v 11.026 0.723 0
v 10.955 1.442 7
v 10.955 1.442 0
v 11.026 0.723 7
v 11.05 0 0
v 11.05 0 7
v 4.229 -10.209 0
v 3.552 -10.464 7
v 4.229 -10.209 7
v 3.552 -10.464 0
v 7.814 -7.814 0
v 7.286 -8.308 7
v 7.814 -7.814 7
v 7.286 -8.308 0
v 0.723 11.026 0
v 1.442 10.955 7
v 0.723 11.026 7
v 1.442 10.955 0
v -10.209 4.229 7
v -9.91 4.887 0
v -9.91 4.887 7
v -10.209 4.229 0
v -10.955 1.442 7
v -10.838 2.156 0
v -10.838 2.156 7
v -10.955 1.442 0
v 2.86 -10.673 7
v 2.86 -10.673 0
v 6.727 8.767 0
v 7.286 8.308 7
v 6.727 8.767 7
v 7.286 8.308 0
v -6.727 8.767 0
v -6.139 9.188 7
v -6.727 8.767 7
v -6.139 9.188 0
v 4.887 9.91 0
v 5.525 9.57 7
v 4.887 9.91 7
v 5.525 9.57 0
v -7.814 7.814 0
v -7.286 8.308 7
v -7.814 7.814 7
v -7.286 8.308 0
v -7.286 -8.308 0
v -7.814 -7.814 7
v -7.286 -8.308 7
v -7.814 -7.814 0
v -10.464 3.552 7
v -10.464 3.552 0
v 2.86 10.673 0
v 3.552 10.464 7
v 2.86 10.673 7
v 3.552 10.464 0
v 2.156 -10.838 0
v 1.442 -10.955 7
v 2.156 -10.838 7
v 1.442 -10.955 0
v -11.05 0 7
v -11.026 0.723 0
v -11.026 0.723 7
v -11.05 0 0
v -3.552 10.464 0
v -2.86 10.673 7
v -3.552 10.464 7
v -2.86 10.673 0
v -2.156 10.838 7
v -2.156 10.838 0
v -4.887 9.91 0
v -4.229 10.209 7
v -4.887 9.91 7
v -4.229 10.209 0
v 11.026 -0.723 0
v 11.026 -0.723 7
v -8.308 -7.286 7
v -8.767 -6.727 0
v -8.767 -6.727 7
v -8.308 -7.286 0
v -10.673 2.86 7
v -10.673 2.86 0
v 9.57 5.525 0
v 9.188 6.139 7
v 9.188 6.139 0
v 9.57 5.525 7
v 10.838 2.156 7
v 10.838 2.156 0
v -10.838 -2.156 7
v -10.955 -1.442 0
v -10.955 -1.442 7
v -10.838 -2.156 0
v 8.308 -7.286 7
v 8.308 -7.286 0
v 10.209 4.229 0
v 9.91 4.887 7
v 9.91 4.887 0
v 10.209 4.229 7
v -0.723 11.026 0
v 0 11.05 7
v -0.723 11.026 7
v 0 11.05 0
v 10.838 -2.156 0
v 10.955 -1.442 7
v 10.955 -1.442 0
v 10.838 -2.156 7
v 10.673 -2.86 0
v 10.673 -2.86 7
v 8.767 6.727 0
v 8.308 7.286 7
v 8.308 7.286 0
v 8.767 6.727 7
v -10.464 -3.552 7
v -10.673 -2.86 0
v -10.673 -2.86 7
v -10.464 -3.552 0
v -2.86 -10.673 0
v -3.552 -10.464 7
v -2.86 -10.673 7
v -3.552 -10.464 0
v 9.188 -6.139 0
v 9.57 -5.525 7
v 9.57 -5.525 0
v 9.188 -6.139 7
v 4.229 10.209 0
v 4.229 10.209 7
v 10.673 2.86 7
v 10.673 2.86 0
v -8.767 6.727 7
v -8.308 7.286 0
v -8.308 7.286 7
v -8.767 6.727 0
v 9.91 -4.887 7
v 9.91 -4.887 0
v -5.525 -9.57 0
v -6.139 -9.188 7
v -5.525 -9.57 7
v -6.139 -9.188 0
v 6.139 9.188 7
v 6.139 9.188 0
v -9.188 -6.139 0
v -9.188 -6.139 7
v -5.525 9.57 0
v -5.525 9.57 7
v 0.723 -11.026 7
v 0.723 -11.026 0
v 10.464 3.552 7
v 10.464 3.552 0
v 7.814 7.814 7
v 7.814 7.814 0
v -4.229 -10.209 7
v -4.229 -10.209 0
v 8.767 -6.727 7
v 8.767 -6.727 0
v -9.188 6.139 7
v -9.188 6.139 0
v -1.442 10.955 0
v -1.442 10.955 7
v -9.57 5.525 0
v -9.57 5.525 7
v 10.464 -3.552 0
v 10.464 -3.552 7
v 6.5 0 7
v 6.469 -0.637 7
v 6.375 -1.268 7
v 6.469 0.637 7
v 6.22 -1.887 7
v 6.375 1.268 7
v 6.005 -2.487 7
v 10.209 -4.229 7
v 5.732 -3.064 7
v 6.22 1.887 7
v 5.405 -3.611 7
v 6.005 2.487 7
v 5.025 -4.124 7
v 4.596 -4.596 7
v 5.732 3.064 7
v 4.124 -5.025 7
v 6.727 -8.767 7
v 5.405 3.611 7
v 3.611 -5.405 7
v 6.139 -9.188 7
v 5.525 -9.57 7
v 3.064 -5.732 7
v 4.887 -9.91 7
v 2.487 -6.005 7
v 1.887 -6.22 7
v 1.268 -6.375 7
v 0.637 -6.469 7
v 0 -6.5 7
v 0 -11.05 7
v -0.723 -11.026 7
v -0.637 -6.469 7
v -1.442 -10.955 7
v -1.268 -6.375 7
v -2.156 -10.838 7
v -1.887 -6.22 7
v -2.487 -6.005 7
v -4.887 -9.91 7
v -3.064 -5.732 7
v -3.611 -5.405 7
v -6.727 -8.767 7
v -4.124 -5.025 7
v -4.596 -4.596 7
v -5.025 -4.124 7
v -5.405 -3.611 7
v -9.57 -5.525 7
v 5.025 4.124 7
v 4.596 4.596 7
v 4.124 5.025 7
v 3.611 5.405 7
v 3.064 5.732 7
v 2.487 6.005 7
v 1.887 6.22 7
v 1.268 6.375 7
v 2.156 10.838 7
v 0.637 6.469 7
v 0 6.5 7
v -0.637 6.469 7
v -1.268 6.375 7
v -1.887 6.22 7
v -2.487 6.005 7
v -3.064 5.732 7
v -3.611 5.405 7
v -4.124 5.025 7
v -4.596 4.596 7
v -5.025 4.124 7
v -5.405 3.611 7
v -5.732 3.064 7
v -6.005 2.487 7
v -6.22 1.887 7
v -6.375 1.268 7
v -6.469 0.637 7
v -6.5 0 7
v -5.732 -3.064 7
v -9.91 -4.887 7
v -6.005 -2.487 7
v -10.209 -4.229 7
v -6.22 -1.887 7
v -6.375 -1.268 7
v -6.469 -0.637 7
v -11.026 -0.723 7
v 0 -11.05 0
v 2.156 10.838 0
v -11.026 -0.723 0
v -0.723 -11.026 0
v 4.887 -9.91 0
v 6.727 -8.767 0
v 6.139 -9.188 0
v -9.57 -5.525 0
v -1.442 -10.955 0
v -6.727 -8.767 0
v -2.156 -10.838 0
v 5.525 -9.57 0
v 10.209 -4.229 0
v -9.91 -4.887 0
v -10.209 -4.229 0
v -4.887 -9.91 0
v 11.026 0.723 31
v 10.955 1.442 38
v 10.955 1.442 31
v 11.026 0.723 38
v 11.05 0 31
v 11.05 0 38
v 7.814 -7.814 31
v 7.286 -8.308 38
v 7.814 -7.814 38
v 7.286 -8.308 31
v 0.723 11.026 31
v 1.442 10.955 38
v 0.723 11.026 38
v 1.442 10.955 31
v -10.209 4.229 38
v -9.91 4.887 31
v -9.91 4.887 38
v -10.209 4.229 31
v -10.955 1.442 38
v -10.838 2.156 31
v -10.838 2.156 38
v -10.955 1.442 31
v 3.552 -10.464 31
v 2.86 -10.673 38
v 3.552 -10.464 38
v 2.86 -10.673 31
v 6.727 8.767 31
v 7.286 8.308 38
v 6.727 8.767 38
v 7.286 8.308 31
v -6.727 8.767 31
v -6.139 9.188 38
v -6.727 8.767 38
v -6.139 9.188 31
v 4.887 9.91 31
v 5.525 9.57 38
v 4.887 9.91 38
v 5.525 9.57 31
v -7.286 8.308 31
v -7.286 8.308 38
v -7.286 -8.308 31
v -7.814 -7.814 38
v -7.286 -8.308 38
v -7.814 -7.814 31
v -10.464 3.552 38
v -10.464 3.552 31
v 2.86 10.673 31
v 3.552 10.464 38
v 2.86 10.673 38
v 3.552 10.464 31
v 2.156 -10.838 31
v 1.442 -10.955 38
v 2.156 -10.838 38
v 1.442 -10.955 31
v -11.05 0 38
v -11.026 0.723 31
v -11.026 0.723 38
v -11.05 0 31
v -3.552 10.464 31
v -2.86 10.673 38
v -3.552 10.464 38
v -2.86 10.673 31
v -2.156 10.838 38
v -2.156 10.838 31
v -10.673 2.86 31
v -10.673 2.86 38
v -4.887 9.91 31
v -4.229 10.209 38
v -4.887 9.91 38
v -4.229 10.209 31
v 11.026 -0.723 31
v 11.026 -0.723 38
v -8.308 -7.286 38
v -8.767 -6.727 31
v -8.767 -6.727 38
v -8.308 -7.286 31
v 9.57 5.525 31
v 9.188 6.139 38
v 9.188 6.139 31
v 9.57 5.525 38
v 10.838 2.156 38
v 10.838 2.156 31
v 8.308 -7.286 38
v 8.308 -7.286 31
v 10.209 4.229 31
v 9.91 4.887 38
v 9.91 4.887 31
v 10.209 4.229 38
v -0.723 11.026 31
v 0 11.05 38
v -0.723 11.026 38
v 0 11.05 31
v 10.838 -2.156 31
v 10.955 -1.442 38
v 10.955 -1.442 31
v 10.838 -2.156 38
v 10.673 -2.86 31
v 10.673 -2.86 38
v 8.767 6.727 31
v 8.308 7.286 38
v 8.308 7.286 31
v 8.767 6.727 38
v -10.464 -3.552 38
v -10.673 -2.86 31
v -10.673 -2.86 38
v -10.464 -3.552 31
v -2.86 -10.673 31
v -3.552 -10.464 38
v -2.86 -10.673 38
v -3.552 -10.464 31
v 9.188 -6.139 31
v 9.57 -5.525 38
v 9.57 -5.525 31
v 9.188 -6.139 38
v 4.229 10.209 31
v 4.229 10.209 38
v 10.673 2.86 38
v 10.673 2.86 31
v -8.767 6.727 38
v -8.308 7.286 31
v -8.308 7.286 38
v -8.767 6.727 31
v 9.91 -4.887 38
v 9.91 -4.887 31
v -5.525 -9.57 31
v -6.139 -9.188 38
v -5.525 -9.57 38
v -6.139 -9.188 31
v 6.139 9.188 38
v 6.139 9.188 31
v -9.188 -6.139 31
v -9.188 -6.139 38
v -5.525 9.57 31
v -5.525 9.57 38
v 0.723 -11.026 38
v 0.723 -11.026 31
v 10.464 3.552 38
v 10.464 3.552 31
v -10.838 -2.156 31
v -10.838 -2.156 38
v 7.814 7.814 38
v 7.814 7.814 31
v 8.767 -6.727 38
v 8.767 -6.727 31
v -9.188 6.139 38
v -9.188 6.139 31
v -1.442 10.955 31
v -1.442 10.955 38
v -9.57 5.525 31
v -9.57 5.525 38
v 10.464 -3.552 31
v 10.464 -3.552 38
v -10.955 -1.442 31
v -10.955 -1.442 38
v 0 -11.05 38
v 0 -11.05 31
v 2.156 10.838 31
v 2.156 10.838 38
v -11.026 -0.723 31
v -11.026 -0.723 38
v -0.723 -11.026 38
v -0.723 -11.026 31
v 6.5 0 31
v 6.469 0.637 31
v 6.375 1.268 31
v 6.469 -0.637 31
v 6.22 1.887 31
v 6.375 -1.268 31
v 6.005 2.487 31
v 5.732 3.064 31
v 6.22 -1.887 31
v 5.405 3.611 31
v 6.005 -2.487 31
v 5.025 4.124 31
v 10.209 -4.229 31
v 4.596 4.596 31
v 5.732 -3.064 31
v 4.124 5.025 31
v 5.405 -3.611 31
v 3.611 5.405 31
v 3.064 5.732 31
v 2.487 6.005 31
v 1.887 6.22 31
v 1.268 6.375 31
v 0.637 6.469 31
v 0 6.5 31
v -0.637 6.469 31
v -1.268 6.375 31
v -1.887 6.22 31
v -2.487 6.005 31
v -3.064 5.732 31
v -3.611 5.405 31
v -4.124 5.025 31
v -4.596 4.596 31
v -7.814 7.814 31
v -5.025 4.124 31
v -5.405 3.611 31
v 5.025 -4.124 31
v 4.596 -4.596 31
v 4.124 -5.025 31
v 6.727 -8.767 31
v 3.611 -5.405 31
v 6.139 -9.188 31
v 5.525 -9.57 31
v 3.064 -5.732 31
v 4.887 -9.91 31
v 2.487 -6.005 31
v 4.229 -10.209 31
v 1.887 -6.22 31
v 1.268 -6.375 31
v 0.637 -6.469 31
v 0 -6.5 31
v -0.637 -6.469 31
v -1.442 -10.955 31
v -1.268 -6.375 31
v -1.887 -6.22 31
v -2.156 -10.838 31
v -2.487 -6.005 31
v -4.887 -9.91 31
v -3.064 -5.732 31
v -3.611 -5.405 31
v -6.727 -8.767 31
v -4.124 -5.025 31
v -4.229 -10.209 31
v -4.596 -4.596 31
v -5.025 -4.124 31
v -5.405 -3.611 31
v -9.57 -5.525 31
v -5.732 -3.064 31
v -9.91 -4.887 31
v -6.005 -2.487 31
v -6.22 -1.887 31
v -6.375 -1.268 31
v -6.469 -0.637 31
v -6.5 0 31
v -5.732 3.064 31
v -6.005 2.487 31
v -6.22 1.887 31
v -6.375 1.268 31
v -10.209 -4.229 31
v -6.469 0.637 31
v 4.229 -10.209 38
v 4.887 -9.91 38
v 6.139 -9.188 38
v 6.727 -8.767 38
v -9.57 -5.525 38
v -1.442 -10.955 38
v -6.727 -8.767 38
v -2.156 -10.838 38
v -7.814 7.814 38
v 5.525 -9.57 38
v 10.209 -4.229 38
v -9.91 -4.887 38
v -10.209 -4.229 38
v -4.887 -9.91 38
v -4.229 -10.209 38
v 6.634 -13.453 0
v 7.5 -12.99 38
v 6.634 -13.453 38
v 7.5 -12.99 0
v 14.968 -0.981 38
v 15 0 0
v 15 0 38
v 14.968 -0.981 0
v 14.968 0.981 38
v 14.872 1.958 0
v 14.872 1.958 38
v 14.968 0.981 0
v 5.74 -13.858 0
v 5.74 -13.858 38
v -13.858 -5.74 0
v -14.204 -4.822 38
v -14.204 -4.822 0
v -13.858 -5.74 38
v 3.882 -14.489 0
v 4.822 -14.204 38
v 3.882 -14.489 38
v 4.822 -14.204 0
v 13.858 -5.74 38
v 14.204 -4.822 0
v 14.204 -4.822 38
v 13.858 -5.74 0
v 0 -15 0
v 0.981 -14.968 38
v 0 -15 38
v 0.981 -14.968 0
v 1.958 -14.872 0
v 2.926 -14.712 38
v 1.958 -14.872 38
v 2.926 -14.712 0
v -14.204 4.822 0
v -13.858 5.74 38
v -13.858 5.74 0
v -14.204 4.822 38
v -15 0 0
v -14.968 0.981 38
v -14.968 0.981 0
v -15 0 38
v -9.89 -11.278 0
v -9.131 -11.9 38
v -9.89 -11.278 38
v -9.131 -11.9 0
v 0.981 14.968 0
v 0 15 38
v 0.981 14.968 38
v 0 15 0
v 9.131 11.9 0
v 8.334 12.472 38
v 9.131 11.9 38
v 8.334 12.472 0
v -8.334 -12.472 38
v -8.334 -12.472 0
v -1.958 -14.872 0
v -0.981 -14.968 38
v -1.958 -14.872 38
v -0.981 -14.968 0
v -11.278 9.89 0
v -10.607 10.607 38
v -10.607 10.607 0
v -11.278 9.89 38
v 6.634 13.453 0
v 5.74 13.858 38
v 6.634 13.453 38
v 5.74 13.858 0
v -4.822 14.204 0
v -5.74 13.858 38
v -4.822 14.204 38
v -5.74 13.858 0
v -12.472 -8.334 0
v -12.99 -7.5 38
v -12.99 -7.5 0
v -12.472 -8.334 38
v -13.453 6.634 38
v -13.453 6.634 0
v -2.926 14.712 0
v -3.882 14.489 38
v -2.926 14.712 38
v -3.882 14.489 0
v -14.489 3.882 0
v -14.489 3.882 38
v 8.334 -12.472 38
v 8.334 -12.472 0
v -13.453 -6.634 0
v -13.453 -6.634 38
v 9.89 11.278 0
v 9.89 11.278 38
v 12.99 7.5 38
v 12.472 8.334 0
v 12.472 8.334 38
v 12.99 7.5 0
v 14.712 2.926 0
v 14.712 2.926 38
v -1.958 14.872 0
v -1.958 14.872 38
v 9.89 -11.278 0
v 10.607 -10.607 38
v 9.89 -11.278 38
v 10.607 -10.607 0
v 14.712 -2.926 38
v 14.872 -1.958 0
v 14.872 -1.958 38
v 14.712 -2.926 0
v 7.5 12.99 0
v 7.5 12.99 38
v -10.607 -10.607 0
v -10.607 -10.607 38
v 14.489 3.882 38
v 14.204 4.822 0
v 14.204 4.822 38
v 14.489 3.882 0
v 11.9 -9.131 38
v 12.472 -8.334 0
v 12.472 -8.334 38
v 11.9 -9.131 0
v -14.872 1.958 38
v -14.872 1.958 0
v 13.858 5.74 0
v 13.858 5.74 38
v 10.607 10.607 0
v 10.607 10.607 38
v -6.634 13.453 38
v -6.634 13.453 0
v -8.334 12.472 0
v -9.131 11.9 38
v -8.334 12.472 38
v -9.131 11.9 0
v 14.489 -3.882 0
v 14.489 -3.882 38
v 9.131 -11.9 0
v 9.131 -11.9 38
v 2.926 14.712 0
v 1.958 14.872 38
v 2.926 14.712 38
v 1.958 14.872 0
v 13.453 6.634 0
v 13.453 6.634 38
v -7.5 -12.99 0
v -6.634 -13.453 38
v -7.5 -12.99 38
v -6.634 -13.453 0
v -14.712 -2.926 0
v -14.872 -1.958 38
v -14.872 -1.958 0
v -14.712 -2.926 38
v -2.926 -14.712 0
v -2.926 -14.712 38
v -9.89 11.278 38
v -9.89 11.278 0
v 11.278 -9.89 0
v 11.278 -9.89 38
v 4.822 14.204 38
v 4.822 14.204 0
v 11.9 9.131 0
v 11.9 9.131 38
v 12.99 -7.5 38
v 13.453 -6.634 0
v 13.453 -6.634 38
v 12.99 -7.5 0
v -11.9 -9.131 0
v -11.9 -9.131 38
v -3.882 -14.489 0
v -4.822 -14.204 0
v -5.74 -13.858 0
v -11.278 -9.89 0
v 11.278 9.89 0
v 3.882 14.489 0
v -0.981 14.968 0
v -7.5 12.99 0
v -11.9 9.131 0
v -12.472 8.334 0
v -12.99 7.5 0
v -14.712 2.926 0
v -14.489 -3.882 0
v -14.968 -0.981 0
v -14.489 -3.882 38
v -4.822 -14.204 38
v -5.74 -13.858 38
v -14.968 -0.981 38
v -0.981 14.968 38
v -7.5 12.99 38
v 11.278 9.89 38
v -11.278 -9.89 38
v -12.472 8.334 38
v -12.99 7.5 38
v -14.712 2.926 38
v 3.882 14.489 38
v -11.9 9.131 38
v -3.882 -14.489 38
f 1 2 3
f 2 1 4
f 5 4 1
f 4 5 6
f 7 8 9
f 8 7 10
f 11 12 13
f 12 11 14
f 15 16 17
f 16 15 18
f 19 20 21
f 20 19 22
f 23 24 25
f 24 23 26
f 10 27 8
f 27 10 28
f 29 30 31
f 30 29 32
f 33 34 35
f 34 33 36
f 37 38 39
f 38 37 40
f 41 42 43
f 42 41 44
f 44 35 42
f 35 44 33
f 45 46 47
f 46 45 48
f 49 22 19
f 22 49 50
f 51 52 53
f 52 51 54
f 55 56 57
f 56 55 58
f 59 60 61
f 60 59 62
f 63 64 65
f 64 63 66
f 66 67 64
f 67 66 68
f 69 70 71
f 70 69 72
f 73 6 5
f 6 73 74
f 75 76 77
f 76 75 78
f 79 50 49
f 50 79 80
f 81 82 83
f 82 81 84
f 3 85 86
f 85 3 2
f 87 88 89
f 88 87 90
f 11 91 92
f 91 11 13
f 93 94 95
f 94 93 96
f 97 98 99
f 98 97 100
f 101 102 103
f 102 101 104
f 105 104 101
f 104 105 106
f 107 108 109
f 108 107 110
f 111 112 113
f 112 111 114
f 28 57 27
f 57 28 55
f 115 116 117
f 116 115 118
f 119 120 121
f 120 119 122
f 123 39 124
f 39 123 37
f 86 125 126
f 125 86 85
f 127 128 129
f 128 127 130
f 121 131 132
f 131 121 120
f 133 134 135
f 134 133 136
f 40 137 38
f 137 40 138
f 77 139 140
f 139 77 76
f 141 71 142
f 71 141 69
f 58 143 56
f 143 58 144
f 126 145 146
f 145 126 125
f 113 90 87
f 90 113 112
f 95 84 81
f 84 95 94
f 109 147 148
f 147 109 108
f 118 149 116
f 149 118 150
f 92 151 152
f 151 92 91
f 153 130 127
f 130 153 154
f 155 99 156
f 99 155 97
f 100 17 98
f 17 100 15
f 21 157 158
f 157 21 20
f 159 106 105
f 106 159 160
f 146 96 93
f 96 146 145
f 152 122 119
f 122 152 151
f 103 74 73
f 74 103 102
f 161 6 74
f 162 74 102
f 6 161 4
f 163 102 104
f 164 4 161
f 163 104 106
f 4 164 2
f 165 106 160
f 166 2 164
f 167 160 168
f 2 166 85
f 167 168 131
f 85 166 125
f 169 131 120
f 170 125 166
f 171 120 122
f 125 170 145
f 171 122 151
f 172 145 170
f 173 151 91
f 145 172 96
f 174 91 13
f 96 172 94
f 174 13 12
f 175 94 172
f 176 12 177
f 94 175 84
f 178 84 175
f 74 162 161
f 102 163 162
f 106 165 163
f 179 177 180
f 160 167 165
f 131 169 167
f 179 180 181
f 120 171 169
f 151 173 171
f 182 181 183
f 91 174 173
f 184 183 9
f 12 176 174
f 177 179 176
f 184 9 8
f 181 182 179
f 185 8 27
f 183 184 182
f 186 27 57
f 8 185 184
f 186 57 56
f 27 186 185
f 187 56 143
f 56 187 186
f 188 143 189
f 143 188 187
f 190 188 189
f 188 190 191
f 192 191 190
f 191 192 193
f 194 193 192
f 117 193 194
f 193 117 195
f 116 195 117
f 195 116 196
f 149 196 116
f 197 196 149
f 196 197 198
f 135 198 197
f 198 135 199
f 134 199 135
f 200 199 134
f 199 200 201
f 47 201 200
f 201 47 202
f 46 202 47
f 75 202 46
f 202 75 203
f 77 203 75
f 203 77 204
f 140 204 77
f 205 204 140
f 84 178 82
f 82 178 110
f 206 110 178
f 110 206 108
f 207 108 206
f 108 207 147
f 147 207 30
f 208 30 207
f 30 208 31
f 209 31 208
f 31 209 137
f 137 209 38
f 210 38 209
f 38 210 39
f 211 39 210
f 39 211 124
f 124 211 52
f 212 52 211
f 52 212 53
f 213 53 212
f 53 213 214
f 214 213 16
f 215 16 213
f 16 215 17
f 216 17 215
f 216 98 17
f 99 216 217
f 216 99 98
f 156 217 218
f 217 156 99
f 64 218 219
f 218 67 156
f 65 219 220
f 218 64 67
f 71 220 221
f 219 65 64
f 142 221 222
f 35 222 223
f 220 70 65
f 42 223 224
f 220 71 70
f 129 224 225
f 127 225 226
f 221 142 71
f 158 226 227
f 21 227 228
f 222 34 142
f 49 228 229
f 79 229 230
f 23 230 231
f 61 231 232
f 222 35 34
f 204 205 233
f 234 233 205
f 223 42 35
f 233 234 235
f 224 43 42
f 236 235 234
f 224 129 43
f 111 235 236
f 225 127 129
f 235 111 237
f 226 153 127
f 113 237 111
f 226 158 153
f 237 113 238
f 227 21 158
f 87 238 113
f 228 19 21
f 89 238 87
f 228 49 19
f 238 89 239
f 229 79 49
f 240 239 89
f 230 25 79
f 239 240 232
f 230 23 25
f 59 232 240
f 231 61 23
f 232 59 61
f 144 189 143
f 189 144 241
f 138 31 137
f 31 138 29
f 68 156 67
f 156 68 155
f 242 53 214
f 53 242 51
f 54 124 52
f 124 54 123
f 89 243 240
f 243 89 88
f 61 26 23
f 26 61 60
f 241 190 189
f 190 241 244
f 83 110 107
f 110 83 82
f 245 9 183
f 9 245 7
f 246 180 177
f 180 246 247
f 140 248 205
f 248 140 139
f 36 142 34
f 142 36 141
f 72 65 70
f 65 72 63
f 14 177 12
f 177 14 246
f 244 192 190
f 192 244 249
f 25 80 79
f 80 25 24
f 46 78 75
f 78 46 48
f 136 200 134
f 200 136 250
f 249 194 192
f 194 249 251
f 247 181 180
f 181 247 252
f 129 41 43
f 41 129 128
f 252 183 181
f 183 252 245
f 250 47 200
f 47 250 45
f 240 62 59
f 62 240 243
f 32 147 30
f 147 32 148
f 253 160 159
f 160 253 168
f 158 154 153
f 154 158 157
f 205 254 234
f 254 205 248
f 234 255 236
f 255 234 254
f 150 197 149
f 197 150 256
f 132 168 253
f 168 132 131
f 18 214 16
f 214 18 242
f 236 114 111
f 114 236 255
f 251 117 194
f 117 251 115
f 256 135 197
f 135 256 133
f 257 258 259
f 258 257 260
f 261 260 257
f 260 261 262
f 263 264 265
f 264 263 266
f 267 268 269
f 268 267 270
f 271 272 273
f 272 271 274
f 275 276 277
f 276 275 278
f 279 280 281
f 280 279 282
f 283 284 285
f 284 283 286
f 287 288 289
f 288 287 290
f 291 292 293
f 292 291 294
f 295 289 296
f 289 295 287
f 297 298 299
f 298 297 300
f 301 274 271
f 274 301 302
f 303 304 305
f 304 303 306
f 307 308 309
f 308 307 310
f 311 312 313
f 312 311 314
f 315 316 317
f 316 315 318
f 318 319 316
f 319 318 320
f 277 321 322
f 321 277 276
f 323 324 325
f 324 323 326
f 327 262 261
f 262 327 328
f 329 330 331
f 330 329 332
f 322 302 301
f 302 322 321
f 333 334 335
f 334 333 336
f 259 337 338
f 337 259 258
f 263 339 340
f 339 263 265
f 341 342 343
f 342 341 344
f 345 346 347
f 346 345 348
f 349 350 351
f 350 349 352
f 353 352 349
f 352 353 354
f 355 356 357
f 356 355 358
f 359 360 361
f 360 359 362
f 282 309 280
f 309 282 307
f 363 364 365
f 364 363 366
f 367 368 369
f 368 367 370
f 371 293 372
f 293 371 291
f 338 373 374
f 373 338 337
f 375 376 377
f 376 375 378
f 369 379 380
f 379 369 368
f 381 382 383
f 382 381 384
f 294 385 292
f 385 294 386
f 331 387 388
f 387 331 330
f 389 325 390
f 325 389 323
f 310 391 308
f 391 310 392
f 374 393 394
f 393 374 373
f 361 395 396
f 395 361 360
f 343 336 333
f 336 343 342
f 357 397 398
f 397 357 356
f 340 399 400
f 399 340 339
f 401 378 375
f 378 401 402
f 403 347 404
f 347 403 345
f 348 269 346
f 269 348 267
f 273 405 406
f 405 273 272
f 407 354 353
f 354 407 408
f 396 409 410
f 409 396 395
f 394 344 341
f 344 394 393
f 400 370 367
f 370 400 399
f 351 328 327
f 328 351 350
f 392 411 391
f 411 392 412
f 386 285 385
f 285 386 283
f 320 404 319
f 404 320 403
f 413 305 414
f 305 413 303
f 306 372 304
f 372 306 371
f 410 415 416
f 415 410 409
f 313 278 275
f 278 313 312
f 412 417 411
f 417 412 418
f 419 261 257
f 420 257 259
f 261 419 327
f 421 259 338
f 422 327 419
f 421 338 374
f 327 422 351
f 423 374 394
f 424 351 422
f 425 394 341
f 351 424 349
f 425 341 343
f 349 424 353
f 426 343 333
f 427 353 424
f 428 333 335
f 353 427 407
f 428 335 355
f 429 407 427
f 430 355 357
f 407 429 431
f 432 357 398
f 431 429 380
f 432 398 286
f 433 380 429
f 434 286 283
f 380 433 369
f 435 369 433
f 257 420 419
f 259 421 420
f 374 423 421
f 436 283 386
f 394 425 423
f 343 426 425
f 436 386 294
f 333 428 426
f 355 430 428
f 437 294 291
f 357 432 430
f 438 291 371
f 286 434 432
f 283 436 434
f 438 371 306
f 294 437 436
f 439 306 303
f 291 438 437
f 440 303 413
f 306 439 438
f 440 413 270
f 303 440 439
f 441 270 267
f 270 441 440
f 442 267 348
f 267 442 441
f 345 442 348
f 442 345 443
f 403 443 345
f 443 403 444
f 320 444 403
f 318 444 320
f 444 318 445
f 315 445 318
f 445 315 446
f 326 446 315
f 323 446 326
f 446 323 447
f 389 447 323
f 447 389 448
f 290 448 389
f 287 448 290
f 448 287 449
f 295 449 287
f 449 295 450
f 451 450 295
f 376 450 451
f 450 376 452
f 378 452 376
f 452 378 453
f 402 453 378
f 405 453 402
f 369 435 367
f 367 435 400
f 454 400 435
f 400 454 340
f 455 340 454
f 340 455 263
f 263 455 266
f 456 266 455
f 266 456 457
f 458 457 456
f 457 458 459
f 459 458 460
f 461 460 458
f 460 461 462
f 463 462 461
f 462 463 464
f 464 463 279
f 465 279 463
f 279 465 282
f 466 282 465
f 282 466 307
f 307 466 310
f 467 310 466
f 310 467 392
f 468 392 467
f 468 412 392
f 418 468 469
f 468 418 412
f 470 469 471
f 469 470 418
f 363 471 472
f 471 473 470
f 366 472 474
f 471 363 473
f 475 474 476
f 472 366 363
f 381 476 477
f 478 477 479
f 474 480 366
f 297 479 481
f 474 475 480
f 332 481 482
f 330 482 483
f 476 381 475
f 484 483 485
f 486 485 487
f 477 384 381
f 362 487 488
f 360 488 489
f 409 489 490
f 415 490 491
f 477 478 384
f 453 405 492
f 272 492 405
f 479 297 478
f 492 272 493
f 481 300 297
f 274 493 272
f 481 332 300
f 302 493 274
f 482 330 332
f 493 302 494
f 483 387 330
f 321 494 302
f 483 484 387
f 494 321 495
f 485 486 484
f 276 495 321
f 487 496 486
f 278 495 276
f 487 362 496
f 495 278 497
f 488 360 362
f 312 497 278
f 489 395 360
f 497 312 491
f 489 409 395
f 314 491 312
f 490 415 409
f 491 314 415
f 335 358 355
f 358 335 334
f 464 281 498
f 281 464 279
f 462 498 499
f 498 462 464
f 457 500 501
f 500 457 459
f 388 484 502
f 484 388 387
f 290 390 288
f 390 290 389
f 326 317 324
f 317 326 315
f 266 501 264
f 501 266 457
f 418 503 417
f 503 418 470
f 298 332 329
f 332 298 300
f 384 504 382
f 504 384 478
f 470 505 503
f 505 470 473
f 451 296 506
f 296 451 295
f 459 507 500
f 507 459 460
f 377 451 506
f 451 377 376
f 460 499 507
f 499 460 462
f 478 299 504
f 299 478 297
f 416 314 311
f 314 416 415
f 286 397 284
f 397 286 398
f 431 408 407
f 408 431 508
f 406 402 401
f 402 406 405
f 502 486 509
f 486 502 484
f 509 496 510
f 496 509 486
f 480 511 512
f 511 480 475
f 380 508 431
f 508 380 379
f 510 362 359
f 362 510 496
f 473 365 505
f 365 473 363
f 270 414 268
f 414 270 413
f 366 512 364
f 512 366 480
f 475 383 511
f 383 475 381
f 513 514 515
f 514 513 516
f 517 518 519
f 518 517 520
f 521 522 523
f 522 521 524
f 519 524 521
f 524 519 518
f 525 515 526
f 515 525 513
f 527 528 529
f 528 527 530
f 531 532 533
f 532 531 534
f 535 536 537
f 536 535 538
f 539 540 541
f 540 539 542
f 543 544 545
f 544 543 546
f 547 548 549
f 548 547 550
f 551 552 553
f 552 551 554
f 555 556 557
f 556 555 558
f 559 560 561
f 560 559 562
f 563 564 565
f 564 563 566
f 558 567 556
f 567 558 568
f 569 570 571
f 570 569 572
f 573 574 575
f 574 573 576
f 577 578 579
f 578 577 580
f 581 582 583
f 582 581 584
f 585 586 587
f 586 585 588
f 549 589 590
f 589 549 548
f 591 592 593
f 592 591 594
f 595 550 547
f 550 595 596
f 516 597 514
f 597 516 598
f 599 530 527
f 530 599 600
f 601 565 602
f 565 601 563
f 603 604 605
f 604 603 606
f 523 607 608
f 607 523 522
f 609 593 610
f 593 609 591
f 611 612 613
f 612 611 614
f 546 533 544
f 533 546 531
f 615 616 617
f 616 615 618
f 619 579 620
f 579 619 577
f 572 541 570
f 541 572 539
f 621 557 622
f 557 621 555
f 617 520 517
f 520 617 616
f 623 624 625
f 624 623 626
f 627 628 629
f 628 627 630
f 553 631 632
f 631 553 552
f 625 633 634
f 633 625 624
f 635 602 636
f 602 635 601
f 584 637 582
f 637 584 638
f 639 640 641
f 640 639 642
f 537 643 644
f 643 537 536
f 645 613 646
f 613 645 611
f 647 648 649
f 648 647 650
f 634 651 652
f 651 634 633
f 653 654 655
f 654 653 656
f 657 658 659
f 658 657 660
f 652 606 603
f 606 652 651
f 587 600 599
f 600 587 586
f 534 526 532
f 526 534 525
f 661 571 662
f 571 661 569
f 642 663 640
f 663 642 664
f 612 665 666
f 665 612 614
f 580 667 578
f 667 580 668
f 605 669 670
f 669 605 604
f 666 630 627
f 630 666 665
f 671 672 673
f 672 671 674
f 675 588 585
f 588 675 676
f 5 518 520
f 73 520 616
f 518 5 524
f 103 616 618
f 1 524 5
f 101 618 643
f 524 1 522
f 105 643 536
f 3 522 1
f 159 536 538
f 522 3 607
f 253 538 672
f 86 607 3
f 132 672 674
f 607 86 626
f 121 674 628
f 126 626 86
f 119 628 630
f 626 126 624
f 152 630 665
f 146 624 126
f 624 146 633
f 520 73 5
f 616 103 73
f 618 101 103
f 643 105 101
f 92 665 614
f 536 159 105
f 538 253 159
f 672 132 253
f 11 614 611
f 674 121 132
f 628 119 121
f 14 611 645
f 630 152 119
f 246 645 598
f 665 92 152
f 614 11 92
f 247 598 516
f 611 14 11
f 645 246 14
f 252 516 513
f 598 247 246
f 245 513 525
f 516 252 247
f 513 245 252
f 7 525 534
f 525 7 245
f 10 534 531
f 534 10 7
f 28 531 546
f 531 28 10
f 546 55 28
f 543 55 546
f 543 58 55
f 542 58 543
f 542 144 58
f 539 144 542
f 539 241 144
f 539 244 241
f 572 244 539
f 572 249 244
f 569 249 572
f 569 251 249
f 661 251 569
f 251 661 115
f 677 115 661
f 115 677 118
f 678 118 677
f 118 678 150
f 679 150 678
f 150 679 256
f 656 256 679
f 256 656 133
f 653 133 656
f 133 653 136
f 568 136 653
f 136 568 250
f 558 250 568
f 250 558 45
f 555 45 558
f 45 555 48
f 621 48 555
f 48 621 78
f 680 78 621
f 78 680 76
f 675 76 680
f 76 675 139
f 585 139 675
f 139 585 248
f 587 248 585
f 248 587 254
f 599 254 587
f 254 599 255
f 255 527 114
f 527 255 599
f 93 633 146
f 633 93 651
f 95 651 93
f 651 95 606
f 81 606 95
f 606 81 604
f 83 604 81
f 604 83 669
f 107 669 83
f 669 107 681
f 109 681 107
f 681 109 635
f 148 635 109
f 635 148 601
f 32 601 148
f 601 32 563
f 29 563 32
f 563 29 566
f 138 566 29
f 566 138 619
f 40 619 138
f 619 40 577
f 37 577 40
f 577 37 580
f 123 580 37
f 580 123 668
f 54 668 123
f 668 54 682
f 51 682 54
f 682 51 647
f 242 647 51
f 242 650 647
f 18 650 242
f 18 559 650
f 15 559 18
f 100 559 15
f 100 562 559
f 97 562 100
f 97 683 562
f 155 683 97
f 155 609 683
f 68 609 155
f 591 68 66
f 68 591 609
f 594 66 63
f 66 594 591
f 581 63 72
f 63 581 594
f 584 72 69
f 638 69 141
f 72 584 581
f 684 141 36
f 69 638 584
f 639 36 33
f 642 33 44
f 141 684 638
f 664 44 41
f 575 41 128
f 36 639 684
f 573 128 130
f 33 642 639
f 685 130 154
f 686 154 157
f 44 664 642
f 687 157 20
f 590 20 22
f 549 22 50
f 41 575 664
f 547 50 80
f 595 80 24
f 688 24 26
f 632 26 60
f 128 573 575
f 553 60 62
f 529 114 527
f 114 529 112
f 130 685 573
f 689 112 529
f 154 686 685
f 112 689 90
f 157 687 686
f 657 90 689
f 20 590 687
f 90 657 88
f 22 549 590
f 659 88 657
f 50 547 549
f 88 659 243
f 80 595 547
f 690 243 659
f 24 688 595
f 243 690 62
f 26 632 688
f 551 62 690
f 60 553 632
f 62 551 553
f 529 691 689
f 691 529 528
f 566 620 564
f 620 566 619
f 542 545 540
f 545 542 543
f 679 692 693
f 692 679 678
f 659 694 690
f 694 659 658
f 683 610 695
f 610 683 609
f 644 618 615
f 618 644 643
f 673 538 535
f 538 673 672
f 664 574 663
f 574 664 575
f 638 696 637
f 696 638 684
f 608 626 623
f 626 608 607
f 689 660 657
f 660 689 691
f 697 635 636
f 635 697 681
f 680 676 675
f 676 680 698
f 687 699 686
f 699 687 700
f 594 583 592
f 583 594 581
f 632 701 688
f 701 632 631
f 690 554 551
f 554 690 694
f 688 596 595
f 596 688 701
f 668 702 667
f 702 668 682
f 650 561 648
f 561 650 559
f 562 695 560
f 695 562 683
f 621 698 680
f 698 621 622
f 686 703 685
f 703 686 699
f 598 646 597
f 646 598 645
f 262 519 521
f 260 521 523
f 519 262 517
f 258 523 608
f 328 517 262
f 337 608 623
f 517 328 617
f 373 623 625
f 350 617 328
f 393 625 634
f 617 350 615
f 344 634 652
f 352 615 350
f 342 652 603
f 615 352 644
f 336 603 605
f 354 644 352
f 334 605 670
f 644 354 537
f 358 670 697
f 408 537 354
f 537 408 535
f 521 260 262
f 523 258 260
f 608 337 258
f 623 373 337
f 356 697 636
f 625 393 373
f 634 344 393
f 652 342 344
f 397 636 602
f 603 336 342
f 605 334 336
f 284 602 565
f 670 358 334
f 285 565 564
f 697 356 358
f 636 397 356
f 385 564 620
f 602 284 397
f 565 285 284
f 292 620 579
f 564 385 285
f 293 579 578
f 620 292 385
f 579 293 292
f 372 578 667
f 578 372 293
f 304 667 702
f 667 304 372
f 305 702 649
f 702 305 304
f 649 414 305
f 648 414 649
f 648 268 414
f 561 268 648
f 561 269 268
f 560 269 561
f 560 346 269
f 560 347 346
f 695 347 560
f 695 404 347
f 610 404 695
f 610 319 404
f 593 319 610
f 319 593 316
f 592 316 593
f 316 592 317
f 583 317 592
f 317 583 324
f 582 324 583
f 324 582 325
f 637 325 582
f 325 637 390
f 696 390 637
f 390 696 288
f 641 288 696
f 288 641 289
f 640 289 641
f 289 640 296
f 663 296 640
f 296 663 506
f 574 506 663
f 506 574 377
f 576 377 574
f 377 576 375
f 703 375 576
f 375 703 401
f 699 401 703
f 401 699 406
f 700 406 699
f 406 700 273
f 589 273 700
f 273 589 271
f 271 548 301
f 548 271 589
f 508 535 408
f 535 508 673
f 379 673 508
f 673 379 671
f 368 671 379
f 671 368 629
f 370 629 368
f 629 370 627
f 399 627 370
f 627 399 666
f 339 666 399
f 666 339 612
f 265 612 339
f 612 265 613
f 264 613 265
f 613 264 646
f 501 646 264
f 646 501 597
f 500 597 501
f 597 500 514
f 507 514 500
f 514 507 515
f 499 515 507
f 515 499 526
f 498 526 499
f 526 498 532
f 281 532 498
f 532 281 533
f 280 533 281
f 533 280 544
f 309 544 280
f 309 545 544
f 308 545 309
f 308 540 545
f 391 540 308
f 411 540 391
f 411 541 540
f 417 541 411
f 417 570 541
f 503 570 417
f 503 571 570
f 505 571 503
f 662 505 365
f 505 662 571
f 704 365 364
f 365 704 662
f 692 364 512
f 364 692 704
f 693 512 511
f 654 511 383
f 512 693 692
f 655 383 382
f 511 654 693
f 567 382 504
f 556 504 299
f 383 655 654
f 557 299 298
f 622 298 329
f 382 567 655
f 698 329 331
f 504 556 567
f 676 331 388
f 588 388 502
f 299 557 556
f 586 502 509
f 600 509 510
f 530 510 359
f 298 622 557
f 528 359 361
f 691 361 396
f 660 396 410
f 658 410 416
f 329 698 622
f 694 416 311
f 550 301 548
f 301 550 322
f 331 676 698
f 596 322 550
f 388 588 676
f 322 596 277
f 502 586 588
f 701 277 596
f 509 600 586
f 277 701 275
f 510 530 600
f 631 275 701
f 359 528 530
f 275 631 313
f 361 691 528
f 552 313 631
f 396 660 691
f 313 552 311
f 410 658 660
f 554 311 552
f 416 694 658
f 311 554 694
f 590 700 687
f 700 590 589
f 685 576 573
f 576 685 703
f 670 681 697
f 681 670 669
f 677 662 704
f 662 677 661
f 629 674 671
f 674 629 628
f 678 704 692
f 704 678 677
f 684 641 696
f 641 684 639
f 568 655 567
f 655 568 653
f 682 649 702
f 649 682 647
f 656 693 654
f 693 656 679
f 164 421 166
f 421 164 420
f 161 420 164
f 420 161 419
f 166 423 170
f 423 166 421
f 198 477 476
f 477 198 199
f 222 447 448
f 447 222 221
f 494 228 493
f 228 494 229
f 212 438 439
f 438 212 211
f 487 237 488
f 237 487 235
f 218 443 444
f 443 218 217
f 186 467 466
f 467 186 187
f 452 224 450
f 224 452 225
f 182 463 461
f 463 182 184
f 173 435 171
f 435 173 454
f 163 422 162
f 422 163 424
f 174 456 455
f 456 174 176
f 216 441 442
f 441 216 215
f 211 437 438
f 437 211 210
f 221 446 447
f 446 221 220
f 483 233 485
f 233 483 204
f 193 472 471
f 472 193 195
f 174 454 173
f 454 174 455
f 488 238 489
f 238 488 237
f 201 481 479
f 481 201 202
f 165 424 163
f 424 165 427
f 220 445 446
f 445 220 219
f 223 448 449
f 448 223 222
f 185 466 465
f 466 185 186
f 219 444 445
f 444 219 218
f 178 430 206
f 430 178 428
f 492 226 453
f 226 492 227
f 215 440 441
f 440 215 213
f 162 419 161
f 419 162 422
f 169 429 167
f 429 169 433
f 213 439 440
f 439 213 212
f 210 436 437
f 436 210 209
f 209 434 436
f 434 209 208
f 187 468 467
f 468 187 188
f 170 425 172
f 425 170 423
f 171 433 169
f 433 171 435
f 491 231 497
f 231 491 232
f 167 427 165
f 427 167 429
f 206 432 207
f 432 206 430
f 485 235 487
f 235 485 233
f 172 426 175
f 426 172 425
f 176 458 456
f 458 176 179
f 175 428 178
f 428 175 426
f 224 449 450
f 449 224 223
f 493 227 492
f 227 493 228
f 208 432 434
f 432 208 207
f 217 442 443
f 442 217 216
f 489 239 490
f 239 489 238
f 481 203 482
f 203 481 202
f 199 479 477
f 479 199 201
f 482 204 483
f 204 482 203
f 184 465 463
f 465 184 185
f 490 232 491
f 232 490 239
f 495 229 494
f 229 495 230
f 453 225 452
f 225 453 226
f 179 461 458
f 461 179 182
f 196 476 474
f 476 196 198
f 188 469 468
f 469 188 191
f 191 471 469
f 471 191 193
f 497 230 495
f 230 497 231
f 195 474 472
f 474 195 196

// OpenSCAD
// file: ../lib/helpers.scad
// Personal helper routines (house style for all OpenSCAD in this repo).
// Conventions:
//   tx/ty/tz(q)  translate along one axis; q may be a list -> replicate
//   txy/tyz/txz  translate in a plane by [a,b] or list of pairs -> replicate
//   rx/ry/rz(q)  rotate about one axis; list -> replicate
//   mx/my/mz(q)  mirror about one axis; list like [0,1] -> original + mirrored
//   cub(d, c)    cube with per-axis centering: 0 from origin, 1 centered,
//                -1 extending negative
//   sq(d, c, r)  2D analog of cub, optional corner radius r
//   hull_seq()   hull each adjacent pair of children (chained hulls)
// Prefer these over raw translate/rotate/mirror throughout.

module hull_seq()
  for (i=[0:$children-2]) hull() { children(i); children(i+1); }

module cub(d, c=[0, 0, 0])
  tx(c[0] == -1 ? -d[0] : c[0] ? -d[0]/2 : 0)
  ty(c[1] == -1 ? -d[1] : c[1] ? -d[1]/2 : 0)
  tz(c[2] == -1 ? -d[2] : c[2] ? -d[2]/2 : 0)
  cube(d);

module sq(d, c=[0, 0], r=0)
  tx(c[0] == -1 ? -d[0] : c[0] ? -d[0]/2 : 0)
  ty(c[1] == -1 ? -d[1] : c[1] ? -d[1]/2 : 0)
  if (r <= 0) { square(d); }
  else { hull() ty([r, d[1]-r]) tx([r, d[0]-r]) circle(r=r); }

module txy(q)
  if (is_list(q) && is_list(q[0])) for (qq=q) txy(qq) children();
  else translate([q[0], q[1], 0]) children();

module tyz(q)
  if (is_list(q) && is_list(q[0])) for (qq=q) tyz(qq) children();
  else translate([0, q[0], q[1]]) children();

module txz(q)
  if (is_list(q) && is_list(q[0])) for (qq=q) txz(qq) children();
  else translate([q[0], 0, q[1]]) children();

module tq(q, v)
  if (is_list(q)) for (qq=q) tq(qq, v) children();
  else translate(q*v) children();

module tx(q) tq(q, [1, 0, 0]) children();
module ty(q) tq(q, [0, 1, 0]) children();
module tz(q) tq(q, [0, 0, 1]) children();

module mq(q, v)
  if (is_list(q)) for (qq=q) mq(qq, v) children();
  else mirror(q*v) children();

module mx(q=1) mq(q, [1, 0, 0]) children();
module my(q=1) mq(q, [0, 1, 0]) children();
module mz(q=1) mq(q, [0, 0, 1]) children();

// generic rotation recursively expands q and rotates about v
module rq(q, v)
  if (is_list(q)) for (qq=q) rq(qq, v) children();
  else rotate(q*v) children();

// specific rotation about x, y, z for everyday convenience
module rx(q) rq(q, [1, 0, 0]) children();
module ry(q) rq(q, [0, 1, 0]) children();
module rz(q) rq(q, [0, 0, 1]) children();
// main file
// Sector pivot bearing tube (printed). Slides snugly through the sector
// stack's pivot bore; two 608s press into pockets at its ends and ride the
// fixed M8 axle, so the sector pivots on ball bearings, not ply-on-bolt —
// pivot friction sits directly in the efficiency measurement, so it must
// be small and repeatable. The tube carries no torque (the six hub bolts
// clamp arm + sector layers directly); it only centers the stack and
// houses the bearings. Print tube-vertical, no supports.

include <params.scad>
use <../lib/helpers.scad>

tube_len = hub_tube_inboard + sector_stack_t + hub_tube_outboard;  // 38

module hub_tube() {
  difference() {
    cylinder(d = hub_tube_od, h = tube_len, $fn = 96);
    // through bore between the pockets (clears the inner-race spacer)
    tz(-0.5) cylinder(d = hub_tube_bore, h = tube_len + 1, $fn = 64);
    // 608 pockets, one from each end
    tz([-0.5, tube_len - bearing_w])
      cylinder(d = bearing_pocket_d, h = bearing_w + 0.5, $fn = 96);
  }
}

hub_tube();
